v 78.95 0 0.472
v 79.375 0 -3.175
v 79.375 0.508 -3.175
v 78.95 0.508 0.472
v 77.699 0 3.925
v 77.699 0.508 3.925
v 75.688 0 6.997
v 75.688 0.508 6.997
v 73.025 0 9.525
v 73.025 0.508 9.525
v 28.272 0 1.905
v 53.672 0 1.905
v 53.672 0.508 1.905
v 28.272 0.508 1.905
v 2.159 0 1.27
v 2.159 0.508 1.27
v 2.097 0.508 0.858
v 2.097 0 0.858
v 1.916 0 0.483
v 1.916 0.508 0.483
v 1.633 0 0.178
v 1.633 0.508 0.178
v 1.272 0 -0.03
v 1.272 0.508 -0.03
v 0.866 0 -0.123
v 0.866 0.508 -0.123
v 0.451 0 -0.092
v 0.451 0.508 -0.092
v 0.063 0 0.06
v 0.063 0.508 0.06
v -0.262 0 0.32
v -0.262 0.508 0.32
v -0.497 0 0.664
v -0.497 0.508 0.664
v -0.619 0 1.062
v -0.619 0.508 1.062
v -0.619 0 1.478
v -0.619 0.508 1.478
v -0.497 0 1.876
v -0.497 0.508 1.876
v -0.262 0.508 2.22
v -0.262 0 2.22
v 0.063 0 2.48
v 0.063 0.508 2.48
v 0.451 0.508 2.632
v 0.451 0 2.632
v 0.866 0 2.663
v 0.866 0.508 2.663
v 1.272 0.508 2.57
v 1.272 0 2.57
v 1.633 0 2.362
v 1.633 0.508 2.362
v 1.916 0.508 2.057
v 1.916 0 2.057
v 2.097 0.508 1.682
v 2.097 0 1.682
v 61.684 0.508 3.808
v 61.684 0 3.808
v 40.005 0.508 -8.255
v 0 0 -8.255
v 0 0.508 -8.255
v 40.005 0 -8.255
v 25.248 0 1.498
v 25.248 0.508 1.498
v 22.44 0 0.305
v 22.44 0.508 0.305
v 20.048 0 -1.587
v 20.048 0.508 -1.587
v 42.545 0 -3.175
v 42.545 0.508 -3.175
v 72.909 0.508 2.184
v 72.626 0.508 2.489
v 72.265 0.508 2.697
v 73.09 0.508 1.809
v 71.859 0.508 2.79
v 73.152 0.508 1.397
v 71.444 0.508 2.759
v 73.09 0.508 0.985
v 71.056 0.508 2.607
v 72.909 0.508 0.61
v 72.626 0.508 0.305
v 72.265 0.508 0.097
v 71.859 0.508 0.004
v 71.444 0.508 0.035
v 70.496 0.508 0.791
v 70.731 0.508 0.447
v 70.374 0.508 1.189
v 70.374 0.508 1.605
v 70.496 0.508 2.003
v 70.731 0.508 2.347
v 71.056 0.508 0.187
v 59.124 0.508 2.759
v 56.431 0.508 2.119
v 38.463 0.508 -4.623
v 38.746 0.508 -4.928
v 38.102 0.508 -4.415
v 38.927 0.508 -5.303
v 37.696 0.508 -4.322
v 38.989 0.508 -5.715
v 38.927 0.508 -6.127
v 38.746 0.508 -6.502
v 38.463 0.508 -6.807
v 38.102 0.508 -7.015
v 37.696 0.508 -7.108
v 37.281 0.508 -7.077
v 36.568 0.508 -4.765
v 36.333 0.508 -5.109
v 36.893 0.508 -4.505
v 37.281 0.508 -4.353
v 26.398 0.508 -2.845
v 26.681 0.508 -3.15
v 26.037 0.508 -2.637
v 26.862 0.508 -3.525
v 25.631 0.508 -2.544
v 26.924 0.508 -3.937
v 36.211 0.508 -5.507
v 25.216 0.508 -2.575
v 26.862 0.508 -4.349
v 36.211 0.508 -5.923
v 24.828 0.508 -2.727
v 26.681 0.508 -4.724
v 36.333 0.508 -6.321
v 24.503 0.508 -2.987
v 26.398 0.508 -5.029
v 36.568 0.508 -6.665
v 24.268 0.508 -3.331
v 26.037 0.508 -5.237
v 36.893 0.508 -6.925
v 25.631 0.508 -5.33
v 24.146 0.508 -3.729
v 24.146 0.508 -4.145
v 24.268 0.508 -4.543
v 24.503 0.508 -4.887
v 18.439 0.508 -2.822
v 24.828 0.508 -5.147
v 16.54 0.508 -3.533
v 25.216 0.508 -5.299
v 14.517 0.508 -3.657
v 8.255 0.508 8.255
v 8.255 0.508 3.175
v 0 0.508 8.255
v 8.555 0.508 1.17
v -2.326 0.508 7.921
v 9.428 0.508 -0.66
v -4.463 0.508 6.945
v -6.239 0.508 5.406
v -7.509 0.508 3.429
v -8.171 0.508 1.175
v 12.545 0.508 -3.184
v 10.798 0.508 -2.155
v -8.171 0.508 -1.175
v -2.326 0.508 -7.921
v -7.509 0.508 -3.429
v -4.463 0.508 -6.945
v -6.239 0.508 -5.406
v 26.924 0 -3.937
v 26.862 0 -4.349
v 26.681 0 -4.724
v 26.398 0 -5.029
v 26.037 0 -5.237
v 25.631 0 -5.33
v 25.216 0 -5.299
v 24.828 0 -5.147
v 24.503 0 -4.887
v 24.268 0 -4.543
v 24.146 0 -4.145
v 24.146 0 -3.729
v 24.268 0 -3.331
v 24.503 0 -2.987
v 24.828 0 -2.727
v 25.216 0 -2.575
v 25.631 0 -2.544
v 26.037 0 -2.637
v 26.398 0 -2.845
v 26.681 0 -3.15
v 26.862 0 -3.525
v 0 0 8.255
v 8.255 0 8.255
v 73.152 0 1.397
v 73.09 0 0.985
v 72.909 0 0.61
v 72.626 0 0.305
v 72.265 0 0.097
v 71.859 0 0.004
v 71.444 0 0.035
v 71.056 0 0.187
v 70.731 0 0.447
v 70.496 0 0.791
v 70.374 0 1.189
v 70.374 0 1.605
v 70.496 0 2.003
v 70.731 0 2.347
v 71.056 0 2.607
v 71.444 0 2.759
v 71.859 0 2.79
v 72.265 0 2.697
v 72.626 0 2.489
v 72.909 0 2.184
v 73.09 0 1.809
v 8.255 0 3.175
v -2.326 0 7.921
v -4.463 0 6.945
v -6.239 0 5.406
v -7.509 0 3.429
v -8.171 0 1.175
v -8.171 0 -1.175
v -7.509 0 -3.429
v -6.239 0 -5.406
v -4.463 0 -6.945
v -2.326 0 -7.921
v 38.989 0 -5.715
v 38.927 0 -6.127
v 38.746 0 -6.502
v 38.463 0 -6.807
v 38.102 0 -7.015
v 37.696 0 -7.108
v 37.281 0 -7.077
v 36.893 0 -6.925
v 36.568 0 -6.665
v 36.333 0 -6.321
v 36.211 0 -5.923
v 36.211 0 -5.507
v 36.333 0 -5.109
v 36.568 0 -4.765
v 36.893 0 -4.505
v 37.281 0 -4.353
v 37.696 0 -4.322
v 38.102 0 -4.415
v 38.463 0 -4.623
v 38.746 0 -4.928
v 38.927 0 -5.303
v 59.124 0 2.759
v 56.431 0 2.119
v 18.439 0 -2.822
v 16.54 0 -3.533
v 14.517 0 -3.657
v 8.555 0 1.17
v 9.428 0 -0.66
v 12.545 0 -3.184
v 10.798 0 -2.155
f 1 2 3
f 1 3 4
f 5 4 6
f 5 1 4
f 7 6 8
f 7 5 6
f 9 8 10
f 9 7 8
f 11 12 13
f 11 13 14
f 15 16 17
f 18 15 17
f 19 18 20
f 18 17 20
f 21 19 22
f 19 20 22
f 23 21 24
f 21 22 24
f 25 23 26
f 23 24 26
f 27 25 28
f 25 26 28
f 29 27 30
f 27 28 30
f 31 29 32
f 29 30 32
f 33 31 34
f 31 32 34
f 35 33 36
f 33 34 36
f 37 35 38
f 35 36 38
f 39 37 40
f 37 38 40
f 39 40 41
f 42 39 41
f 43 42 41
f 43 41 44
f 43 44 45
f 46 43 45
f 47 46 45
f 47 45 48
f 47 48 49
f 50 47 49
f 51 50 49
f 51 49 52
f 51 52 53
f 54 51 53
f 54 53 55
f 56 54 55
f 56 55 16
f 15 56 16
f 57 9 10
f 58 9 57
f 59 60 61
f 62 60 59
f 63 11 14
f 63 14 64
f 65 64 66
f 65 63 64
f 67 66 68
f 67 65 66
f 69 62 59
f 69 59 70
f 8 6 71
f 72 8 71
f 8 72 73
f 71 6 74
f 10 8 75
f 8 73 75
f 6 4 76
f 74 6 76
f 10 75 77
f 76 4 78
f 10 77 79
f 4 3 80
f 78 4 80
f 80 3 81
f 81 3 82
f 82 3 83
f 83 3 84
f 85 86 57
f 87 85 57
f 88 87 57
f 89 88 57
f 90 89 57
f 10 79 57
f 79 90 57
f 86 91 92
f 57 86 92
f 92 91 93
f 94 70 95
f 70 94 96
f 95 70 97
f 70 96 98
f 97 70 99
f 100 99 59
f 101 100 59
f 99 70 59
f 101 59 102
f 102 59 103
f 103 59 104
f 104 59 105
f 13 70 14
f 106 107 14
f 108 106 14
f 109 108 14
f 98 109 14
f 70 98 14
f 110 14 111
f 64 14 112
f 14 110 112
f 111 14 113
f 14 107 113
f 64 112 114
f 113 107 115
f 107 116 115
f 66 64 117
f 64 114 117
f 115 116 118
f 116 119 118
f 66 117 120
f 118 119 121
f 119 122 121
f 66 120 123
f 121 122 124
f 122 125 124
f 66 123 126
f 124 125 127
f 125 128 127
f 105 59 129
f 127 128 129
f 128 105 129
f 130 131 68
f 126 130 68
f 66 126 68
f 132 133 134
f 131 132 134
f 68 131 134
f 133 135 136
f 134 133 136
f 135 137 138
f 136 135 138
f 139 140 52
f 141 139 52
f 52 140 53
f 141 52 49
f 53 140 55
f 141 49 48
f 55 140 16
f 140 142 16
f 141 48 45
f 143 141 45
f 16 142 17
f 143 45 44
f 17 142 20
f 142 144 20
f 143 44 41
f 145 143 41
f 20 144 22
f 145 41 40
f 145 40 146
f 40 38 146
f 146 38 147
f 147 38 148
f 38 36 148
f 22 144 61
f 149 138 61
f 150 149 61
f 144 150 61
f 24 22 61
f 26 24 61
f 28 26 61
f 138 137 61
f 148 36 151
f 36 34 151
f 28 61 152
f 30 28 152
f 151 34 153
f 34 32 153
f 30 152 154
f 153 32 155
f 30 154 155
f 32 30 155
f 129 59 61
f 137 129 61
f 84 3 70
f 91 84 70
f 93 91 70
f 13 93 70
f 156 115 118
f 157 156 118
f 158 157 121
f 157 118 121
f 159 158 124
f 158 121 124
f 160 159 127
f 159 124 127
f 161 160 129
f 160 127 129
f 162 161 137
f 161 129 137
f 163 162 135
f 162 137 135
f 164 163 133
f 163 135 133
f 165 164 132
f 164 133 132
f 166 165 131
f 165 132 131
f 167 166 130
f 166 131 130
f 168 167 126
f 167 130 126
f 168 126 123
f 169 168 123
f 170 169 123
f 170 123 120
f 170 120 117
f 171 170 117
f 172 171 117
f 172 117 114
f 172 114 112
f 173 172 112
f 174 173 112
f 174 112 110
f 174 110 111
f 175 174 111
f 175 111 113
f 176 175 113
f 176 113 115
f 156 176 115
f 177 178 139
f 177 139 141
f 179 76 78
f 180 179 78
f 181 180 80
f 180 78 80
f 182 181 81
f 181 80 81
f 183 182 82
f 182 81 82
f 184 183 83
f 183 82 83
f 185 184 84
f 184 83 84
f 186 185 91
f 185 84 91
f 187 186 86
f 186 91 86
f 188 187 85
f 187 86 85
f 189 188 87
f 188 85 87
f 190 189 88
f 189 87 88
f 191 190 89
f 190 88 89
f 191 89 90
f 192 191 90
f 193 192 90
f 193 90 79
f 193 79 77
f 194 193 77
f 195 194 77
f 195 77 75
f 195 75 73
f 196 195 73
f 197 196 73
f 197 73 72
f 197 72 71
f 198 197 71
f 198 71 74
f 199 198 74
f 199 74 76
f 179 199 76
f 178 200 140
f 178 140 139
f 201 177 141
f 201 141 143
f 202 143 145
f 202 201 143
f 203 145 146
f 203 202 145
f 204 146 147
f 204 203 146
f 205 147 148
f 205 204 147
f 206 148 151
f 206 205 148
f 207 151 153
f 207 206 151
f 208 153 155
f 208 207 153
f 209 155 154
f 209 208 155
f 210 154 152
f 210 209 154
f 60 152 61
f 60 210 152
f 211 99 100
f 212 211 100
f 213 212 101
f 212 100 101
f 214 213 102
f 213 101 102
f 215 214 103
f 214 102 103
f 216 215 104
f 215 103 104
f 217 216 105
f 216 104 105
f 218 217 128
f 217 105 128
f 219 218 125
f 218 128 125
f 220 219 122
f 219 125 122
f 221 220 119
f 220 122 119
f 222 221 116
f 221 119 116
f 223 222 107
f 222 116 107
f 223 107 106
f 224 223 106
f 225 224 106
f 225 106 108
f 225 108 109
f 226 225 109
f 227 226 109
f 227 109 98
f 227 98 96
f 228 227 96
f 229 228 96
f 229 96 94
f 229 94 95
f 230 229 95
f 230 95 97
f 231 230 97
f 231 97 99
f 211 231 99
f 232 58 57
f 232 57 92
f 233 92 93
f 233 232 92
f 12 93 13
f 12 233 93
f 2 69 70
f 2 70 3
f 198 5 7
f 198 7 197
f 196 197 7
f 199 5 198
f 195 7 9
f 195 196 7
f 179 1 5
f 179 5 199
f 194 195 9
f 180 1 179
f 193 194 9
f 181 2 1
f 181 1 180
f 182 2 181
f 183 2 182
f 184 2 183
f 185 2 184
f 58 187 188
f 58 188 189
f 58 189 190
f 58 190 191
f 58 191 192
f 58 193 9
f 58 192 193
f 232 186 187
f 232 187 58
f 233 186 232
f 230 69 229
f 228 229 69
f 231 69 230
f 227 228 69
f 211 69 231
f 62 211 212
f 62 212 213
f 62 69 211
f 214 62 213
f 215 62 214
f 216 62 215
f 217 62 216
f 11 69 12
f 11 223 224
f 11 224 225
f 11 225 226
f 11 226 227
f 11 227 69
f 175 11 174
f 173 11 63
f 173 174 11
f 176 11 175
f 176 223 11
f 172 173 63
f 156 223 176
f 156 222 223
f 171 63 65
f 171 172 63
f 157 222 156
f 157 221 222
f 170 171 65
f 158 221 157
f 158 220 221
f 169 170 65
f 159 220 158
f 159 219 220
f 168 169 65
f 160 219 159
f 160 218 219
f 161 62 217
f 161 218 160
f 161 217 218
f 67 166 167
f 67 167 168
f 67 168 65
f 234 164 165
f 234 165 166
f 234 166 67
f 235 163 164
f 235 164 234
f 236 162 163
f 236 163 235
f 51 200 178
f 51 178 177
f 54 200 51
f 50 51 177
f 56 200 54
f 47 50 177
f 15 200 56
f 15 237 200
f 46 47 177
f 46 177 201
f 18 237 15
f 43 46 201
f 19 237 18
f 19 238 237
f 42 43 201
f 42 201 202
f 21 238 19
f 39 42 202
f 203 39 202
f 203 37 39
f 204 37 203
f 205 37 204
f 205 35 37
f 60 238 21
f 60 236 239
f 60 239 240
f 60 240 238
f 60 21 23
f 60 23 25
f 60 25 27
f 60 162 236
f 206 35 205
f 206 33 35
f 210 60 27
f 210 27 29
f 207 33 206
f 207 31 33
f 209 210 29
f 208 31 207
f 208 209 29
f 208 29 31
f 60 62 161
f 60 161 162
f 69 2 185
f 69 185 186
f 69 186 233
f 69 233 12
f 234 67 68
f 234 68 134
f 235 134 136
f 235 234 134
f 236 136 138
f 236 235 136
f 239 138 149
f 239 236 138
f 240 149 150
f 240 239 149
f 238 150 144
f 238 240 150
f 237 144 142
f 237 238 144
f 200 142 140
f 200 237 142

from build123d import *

# Parameters (mm, degrees)
BOSS_EXTRUDE1_DEPTH = 0.508
SKETCH2_R           = 1.397
CUT_EXTRUDE1_DEPTH  = 1.508


with BuildPart() as part:
    # Sketch1 → Boss-Extrude1 (new body)
    with BuildSketch(Plane(origin=(0, 0, 0), x_dir=(1, 0, 0), z_dir=(0, 1, 0))):
        with BuildLine():
            Line((0, 8.255), (40.005, 8.255))
            Line((40.005, 8.255), (42.545, 3.175))
            Line((42.545, 3.175), (79.375, 3.175))
            ThreePointArc((79.375, 3.175), (77.699031657, -3.924515829), (73.025, -9.525))
            Line((73.025, -9.525), (61.684438597, -3.808211822))
            ThreePointArc((61.684438597, -3.808211822), (57.789960212, -2.38631827), (53.672063189, -1.905))
            Line((53.672063189, -1.905), (28.272063189, -1.905))
            ThreePointArc((28.272063189, -1.905), (23.804442177, -0.995706369), (20.047648696, 1.5875))
            ThreePointArc((20.047648696, 1.5875), (12.544893378, 3.184008757), (8.255, -3.175))
            Line((8.255, -3.175), (8.255, -8.255))
            Line((8.255, -8.255), (0, -8.255))
            ThreePointArc((0, -8.255), (-8.255, 0), (0, 8.255))
        make_face()
    extrude(amount=BOSS_EXTRUDE1_DEPTH)

    # Sketch2 → Cut-Extrude1 (cut, through all)
    with BuildSketch(Plane(origin=(0, 0.508, 0), x_dir=(1, 0, 0), z_dir=(0, 1, 0))):
        with Locations((0.762, -1.27)):
            Circle(SKETCH2_R)
        with Locations((25.527, 3.937)):
            Circle(SKETCH2_R)
        with Locations((37.592, 5.715)):
            Circle(SKETCH2_R)
        with Locations((71.755, -1.397)):
            Circle(SKETCH2_R)
    extrude(amount=-CUT_EXTRUDE1_DEPTH, mode=Mode.SUBTRACT)


solid = part.part
